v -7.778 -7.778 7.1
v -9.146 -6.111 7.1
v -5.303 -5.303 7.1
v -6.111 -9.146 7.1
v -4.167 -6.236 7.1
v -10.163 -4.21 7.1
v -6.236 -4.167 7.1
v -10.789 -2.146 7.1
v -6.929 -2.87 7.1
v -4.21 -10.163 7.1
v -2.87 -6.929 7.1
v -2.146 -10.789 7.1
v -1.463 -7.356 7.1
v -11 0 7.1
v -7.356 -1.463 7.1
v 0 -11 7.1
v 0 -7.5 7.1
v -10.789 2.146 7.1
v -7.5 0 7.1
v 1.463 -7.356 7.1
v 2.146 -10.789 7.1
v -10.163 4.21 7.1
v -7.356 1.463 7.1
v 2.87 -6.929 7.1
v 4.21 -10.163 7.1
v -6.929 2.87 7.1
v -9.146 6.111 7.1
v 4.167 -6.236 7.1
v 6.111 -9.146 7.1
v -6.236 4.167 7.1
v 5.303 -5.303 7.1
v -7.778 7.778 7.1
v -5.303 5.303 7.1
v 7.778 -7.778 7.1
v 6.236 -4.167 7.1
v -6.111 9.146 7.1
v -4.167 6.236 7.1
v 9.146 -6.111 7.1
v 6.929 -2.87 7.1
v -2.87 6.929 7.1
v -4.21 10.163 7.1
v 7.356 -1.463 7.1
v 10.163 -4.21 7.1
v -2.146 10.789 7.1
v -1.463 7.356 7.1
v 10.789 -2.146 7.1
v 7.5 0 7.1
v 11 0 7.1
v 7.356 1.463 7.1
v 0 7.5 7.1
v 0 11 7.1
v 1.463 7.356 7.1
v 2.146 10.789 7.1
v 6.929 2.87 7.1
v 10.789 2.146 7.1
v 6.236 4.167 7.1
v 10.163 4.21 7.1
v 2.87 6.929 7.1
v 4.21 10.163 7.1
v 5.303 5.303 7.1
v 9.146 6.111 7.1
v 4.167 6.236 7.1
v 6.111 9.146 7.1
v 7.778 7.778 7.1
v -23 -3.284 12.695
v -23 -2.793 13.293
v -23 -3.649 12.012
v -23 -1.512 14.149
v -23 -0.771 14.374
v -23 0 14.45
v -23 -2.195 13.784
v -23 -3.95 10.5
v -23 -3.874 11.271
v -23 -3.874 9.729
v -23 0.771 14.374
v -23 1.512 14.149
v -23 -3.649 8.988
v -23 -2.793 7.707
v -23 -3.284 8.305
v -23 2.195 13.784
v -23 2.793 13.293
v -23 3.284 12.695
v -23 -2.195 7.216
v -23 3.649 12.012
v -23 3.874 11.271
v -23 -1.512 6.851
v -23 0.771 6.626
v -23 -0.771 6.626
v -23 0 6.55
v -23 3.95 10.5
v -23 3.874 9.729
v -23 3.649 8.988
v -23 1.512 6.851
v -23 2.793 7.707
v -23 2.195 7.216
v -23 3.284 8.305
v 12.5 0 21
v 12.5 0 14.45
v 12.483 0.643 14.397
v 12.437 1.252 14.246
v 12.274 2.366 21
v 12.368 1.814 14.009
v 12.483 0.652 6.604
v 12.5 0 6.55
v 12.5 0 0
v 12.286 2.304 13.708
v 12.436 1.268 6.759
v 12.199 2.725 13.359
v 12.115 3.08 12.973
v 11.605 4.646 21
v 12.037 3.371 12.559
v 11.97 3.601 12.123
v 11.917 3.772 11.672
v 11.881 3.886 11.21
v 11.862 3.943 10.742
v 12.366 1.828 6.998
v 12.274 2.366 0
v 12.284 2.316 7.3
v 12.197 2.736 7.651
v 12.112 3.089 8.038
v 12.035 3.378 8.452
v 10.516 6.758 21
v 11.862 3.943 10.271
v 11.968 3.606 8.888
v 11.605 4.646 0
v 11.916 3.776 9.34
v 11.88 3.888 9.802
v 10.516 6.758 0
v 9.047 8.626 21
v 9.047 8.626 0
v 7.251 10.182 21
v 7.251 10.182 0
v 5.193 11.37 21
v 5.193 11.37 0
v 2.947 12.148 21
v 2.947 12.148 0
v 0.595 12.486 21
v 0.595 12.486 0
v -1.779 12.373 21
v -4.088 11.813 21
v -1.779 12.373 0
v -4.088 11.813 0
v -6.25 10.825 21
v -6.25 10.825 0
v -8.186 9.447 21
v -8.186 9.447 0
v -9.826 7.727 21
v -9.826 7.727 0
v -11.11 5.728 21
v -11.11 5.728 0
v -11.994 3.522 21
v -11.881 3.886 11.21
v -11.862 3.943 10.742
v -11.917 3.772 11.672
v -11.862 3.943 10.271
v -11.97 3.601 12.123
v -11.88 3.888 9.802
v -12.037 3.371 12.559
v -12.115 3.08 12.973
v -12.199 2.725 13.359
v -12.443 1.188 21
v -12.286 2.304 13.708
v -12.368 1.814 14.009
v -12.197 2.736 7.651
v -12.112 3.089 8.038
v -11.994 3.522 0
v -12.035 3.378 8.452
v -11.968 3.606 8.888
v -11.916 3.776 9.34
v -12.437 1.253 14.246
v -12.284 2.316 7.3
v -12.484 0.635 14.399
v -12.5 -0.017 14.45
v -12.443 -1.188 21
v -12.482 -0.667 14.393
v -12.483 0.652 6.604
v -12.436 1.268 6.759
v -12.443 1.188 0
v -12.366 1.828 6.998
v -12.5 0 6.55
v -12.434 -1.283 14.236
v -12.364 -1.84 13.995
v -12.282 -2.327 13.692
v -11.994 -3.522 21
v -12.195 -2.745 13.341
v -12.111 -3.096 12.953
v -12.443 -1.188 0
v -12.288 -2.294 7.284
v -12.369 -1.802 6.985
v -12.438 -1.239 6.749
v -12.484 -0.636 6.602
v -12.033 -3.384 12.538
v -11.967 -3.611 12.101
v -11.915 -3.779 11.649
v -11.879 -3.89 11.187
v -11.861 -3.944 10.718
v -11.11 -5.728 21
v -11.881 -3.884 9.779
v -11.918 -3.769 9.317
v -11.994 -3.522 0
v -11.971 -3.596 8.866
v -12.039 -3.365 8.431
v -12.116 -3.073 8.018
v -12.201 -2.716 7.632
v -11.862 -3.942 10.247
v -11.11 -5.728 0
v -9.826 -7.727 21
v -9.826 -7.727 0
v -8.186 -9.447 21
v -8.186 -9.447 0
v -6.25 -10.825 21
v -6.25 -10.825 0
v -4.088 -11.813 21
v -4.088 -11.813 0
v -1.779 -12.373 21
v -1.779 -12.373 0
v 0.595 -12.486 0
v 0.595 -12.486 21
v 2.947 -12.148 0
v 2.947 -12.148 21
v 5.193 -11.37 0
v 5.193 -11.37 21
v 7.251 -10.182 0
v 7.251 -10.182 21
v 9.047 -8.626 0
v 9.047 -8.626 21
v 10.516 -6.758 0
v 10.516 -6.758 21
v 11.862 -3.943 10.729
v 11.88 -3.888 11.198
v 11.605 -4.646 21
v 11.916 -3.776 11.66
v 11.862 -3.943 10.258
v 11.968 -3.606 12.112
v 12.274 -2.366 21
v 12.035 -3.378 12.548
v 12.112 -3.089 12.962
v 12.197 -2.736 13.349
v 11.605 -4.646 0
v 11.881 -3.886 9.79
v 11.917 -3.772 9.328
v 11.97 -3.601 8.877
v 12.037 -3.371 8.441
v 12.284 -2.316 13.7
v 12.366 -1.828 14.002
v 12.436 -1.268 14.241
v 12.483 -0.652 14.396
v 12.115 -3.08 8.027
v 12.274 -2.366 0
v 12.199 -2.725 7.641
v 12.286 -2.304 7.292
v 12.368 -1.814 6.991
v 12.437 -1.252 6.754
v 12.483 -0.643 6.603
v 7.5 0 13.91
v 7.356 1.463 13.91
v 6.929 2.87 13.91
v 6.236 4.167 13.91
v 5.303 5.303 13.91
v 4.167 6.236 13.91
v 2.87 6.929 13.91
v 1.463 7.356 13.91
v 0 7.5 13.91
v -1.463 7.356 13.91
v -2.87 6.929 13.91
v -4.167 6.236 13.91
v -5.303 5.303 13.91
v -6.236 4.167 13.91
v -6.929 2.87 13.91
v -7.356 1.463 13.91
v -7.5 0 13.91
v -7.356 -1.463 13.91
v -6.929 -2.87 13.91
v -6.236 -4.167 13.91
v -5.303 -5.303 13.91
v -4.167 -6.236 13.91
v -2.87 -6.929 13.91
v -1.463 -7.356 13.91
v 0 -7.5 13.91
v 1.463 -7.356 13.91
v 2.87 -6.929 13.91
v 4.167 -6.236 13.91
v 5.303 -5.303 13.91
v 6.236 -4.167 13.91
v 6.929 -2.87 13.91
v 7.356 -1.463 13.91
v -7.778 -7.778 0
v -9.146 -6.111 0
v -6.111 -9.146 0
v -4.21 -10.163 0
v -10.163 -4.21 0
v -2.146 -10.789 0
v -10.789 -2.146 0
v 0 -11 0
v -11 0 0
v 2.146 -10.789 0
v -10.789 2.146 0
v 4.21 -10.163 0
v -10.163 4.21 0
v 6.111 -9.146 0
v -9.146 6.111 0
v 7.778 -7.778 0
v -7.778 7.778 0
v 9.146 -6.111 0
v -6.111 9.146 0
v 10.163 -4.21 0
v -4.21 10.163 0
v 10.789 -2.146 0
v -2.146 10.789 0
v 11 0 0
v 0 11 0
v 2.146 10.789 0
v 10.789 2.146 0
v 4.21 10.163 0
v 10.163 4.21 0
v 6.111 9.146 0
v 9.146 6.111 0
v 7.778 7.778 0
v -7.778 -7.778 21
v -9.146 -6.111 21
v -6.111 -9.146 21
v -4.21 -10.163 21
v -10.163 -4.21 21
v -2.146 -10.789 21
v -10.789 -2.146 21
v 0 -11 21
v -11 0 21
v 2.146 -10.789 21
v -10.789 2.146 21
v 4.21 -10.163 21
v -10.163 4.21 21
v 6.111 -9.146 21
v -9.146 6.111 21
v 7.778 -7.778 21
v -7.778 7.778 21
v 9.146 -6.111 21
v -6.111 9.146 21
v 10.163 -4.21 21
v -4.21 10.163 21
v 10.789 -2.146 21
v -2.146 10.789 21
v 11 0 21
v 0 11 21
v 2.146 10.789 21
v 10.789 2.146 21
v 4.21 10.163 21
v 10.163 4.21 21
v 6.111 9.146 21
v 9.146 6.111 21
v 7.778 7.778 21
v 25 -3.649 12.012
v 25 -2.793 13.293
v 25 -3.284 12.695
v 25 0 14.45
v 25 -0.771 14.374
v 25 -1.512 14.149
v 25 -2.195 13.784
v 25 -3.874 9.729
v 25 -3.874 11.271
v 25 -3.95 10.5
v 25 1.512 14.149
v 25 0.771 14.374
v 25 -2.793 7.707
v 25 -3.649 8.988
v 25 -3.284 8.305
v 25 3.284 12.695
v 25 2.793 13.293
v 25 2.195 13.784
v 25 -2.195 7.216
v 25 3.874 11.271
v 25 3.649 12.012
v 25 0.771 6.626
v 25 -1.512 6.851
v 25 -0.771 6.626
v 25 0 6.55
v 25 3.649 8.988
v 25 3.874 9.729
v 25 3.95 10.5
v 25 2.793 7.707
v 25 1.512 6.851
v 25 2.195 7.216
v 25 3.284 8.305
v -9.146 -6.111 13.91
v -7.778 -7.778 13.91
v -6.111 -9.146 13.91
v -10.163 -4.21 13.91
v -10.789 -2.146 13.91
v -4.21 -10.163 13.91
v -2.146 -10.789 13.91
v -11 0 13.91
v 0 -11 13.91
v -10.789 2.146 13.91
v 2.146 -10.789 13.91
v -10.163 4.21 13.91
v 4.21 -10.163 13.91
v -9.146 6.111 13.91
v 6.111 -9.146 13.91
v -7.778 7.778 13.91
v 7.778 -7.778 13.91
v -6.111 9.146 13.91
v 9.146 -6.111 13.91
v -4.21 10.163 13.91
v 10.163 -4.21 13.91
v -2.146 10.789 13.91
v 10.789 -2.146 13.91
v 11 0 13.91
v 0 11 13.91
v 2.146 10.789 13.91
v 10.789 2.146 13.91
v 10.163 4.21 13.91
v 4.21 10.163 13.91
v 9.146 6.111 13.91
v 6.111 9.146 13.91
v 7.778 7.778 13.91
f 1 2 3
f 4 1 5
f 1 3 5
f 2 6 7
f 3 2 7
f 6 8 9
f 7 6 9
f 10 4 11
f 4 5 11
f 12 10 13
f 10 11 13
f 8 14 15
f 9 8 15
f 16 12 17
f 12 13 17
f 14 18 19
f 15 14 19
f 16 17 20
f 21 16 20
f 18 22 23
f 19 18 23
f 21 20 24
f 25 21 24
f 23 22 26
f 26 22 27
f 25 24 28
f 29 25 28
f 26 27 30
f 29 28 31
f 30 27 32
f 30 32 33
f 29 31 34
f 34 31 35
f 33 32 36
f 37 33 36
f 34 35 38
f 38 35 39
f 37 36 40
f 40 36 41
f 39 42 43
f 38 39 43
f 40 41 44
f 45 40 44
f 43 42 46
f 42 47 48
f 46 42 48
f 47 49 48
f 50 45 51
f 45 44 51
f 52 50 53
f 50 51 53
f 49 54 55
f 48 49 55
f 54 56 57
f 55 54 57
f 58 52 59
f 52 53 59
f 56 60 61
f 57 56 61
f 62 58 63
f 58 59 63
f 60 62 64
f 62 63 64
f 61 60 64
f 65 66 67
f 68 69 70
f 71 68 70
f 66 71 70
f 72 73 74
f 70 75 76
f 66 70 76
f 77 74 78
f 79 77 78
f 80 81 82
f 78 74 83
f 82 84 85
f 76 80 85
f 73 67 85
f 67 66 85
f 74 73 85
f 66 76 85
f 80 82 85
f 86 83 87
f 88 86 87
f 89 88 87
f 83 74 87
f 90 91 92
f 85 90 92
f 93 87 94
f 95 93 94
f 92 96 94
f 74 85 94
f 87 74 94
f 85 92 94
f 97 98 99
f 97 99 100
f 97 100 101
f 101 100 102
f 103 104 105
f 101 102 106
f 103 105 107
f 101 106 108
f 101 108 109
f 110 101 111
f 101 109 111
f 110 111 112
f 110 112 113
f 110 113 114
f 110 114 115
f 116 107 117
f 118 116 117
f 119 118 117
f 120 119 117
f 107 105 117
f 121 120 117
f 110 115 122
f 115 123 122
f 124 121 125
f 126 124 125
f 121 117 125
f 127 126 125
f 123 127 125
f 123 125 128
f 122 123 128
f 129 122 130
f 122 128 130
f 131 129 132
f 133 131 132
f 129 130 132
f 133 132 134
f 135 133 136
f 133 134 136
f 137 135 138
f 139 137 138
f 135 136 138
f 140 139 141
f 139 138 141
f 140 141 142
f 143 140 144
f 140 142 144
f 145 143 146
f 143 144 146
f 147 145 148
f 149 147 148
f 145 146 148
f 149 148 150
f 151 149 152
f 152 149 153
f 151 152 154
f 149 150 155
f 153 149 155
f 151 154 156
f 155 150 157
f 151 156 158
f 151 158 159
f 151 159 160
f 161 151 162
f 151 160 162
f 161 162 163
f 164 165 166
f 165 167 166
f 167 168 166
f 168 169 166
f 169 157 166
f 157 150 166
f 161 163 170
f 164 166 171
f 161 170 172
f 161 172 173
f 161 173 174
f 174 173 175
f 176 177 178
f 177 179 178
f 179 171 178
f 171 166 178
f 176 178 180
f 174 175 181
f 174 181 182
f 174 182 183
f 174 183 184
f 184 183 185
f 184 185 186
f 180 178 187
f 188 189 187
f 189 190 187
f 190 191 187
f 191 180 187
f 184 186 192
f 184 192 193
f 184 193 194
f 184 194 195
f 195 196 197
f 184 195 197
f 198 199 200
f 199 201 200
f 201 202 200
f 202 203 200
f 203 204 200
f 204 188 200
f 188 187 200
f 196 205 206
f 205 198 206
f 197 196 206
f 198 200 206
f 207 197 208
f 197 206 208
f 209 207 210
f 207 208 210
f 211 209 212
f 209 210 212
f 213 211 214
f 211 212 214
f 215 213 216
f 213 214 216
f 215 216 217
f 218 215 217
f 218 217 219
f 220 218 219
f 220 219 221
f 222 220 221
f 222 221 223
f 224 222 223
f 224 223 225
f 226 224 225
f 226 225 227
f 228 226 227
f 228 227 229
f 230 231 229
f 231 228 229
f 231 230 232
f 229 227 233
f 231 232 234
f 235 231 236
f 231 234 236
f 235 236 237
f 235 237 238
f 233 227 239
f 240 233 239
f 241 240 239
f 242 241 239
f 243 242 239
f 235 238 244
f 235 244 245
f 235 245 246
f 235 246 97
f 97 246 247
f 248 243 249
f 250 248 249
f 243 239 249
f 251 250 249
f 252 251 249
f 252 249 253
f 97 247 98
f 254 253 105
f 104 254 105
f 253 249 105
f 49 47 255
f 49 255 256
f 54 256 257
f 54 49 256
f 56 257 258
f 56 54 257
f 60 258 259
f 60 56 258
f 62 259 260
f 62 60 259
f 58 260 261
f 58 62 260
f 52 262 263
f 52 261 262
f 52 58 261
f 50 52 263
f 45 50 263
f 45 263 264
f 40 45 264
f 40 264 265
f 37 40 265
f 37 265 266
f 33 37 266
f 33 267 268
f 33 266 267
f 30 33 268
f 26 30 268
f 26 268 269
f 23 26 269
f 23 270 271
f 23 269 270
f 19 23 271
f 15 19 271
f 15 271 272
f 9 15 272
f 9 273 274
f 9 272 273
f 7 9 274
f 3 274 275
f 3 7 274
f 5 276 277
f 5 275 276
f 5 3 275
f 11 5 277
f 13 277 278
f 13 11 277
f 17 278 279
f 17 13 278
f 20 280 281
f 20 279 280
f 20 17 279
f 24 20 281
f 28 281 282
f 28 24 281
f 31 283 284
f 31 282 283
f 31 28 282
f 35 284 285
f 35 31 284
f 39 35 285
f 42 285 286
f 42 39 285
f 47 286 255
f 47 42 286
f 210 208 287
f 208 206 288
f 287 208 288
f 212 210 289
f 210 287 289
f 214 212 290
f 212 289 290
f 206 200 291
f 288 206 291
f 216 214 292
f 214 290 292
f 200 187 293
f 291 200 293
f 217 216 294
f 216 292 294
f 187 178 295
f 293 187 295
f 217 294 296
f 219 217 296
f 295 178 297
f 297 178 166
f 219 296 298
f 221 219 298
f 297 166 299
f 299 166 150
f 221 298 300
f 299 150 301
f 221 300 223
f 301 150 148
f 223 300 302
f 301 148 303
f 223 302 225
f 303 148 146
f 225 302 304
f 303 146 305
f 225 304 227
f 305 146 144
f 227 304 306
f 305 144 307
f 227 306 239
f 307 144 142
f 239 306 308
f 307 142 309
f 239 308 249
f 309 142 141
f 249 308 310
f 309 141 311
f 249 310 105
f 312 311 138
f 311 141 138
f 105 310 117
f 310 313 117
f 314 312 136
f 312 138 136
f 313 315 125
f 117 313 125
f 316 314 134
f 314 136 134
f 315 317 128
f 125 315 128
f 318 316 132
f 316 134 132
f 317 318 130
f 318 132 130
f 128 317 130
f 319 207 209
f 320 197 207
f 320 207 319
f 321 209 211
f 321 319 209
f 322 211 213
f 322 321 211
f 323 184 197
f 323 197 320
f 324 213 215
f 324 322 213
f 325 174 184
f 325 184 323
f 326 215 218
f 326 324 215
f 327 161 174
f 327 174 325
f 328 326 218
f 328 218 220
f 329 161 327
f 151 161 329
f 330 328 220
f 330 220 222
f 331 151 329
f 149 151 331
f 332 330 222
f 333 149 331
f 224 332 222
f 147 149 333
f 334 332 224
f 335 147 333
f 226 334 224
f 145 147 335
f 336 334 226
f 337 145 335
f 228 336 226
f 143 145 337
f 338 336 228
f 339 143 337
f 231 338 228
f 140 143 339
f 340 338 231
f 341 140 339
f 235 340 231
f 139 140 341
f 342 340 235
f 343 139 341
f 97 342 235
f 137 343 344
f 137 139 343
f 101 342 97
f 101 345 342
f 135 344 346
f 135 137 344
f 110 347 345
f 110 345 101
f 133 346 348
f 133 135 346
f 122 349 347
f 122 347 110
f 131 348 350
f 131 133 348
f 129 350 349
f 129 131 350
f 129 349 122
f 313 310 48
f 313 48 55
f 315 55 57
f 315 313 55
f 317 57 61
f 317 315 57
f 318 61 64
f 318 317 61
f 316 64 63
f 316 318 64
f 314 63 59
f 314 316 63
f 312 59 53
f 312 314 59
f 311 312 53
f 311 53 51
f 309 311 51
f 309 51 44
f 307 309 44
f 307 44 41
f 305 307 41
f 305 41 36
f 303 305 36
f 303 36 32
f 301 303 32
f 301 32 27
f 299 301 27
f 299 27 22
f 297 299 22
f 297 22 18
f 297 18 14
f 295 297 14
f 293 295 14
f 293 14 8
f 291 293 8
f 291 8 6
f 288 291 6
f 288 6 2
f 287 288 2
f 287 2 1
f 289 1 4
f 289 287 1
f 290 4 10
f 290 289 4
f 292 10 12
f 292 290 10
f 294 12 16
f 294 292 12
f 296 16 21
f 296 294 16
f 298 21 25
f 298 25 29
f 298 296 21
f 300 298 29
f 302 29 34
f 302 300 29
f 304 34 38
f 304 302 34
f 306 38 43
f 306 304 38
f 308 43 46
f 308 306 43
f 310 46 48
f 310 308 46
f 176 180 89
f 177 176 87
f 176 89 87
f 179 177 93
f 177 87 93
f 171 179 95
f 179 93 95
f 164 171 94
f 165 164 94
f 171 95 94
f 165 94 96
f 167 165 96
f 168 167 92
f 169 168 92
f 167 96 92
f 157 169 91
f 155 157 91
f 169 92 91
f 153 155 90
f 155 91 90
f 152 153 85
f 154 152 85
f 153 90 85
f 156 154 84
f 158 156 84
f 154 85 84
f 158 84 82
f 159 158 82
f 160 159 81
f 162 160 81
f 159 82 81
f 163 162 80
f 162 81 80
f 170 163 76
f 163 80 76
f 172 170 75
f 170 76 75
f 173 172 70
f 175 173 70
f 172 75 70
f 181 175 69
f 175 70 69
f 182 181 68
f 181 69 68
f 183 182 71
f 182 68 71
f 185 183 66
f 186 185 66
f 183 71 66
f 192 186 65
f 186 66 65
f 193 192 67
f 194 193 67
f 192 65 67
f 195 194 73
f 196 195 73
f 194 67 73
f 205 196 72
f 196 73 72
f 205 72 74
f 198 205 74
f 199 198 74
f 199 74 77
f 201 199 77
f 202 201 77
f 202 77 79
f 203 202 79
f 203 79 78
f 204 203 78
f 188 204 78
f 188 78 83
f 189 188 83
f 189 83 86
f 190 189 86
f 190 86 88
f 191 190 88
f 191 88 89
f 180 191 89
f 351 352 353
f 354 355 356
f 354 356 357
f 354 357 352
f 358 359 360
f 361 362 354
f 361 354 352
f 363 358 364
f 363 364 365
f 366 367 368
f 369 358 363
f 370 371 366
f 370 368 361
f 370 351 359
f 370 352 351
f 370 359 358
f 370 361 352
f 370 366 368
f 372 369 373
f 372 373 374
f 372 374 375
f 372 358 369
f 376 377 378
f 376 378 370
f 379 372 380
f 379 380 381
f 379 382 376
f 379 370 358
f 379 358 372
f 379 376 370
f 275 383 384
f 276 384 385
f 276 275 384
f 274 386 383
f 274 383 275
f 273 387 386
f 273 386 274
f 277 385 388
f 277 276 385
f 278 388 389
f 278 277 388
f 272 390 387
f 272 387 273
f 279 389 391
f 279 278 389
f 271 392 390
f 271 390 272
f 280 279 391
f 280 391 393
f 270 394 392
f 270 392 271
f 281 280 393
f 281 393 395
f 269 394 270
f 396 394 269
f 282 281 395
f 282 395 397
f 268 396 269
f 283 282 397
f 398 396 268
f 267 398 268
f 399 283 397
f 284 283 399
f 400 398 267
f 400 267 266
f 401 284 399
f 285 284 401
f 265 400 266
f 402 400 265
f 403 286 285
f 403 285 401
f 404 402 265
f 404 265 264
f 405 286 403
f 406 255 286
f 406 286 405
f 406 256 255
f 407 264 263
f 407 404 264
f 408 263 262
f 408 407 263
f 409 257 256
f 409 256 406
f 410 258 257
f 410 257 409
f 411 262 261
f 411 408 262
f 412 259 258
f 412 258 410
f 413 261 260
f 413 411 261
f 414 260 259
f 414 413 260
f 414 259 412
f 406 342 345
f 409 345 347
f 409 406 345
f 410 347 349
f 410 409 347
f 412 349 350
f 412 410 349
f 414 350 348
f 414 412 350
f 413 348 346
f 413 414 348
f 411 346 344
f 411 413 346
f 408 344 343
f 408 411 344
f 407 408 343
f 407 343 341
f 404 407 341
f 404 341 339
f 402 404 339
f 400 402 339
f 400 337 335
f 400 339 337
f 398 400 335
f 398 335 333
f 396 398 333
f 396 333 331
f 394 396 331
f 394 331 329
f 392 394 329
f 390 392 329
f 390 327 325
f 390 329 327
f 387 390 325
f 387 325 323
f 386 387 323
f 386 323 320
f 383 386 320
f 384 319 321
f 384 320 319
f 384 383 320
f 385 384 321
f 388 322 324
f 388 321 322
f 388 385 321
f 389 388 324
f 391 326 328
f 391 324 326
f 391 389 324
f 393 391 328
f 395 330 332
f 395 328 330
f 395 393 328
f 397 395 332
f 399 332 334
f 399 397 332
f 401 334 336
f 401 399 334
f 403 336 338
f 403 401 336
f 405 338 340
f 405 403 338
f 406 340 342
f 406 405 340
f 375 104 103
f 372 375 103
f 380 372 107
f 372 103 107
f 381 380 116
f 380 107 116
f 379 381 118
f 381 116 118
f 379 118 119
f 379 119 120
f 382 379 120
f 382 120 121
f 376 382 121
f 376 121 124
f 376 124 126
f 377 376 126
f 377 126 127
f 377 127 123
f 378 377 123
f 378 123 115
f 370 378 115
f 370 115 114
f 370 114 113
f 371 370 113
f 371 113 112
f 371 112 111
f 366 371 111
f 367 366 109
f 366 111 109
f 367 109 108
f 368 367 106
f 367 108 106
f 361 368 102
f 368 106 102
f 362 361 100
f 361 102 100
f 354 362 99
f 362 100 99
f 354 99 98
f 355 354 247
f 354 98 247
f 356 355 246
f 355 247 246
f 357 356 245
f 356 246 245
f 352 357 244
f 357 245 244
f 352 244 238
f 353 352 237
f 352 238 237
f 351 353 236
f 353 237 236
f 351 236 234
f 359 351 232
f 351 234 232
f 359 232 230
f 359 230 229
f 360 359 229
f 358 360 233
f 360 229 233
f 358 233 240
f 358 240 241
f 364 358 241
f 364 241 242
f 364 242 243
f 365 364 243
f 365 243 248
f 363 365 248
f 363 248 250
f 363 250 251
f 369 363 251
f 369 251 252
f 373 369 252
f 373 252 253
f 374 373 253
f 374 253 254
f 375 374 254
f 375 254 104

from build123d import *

# Parameters (mm, degrees)
CYLINDER001_R           = 7.5
CYLINDER001_DEPTH       = 50
CYLINDER003_R           = 11
CYLINDER003_DEPTH       = 7.1
CYLINDER002_R           = 11
CYLINDER002_DEPTH       = 7.1
CYLINDER004_R           = 3.95
CYLINDER004_DEPTH       = 48
CYLINDER004_PITCH_ANGLE = 90
CYLINDER_R              = 12.5
CYLINDER_DEPTH          = 21


with BuildPart() as cylindre001:
    # Cylinder001 → Cylinder001 (new body)
    with BuildSketch(Plane.XY.offset(-11)):
        Circle(CYLINDER001_R)
    extrude(amount=CYLINDER001_DEPTH)


with BuildPart() as cylindre003:
    # Cylinder003 → Cylinder003 (new body)
    with BuildSketch(Plane.XY.offset(13.91)):
        Circle(CYLINDER003_R)
    extrude(amount=CYLINDER003_DEPTH)


with BuildPart() as cylindre002:
    # Cylinder002 → Cylinder002 (new body)
    with BuildSketch(Plane.XY.offset(-0.0001)):
        Circle(CYLINDER002_R)
    extrude(amount=CYLINDER002_DEPTH)


with BuildPart() as axe_rotation:
    # Cylinder004 → Cylinder004 (new body)
    with BuildSketch(Plane.XY):
        Circle(CYLINDER004_R)
    extrude(amount=CYLINDER004_DEPTH)


with BuildPart() as axe_rotation_1:
    # Cylinder004 pitch: moved
    add(axe_rotation.part.rotate(Axis((0, 0, 0), (0, 1, 0)), CYLINDER004_PITCH_ANGLE))


with BuildPart() as axe_rotation_2:
    # Cylinder004 placement: moved
    add(axe_rotation_1.part.moved(Location((-23, 0, 10.5))))


with BuildPart() as centrale:
    # Cylinder → Cylinder (new body)
    with BuildSketch(Plane.XY):
        Circle(CYLINDER_R)
    extrude(amount=CYLINDER_DEPTH)

    # Fusion: union Axe rotation
    add(axe_rotation_2.part)

    # Cut003: cut Cylindre002
    add(cylindre002.part, mode=Mode.SUBTRACT)

    # Cut004: cut Cylindre003
    add(cylindre003.part, mode=Mode.SUBTRACT)

    # Cut005: cut Cylindre001
    add(cylindre001.part, mode=Mode.SUBTRACT)


solid = centrale.part
